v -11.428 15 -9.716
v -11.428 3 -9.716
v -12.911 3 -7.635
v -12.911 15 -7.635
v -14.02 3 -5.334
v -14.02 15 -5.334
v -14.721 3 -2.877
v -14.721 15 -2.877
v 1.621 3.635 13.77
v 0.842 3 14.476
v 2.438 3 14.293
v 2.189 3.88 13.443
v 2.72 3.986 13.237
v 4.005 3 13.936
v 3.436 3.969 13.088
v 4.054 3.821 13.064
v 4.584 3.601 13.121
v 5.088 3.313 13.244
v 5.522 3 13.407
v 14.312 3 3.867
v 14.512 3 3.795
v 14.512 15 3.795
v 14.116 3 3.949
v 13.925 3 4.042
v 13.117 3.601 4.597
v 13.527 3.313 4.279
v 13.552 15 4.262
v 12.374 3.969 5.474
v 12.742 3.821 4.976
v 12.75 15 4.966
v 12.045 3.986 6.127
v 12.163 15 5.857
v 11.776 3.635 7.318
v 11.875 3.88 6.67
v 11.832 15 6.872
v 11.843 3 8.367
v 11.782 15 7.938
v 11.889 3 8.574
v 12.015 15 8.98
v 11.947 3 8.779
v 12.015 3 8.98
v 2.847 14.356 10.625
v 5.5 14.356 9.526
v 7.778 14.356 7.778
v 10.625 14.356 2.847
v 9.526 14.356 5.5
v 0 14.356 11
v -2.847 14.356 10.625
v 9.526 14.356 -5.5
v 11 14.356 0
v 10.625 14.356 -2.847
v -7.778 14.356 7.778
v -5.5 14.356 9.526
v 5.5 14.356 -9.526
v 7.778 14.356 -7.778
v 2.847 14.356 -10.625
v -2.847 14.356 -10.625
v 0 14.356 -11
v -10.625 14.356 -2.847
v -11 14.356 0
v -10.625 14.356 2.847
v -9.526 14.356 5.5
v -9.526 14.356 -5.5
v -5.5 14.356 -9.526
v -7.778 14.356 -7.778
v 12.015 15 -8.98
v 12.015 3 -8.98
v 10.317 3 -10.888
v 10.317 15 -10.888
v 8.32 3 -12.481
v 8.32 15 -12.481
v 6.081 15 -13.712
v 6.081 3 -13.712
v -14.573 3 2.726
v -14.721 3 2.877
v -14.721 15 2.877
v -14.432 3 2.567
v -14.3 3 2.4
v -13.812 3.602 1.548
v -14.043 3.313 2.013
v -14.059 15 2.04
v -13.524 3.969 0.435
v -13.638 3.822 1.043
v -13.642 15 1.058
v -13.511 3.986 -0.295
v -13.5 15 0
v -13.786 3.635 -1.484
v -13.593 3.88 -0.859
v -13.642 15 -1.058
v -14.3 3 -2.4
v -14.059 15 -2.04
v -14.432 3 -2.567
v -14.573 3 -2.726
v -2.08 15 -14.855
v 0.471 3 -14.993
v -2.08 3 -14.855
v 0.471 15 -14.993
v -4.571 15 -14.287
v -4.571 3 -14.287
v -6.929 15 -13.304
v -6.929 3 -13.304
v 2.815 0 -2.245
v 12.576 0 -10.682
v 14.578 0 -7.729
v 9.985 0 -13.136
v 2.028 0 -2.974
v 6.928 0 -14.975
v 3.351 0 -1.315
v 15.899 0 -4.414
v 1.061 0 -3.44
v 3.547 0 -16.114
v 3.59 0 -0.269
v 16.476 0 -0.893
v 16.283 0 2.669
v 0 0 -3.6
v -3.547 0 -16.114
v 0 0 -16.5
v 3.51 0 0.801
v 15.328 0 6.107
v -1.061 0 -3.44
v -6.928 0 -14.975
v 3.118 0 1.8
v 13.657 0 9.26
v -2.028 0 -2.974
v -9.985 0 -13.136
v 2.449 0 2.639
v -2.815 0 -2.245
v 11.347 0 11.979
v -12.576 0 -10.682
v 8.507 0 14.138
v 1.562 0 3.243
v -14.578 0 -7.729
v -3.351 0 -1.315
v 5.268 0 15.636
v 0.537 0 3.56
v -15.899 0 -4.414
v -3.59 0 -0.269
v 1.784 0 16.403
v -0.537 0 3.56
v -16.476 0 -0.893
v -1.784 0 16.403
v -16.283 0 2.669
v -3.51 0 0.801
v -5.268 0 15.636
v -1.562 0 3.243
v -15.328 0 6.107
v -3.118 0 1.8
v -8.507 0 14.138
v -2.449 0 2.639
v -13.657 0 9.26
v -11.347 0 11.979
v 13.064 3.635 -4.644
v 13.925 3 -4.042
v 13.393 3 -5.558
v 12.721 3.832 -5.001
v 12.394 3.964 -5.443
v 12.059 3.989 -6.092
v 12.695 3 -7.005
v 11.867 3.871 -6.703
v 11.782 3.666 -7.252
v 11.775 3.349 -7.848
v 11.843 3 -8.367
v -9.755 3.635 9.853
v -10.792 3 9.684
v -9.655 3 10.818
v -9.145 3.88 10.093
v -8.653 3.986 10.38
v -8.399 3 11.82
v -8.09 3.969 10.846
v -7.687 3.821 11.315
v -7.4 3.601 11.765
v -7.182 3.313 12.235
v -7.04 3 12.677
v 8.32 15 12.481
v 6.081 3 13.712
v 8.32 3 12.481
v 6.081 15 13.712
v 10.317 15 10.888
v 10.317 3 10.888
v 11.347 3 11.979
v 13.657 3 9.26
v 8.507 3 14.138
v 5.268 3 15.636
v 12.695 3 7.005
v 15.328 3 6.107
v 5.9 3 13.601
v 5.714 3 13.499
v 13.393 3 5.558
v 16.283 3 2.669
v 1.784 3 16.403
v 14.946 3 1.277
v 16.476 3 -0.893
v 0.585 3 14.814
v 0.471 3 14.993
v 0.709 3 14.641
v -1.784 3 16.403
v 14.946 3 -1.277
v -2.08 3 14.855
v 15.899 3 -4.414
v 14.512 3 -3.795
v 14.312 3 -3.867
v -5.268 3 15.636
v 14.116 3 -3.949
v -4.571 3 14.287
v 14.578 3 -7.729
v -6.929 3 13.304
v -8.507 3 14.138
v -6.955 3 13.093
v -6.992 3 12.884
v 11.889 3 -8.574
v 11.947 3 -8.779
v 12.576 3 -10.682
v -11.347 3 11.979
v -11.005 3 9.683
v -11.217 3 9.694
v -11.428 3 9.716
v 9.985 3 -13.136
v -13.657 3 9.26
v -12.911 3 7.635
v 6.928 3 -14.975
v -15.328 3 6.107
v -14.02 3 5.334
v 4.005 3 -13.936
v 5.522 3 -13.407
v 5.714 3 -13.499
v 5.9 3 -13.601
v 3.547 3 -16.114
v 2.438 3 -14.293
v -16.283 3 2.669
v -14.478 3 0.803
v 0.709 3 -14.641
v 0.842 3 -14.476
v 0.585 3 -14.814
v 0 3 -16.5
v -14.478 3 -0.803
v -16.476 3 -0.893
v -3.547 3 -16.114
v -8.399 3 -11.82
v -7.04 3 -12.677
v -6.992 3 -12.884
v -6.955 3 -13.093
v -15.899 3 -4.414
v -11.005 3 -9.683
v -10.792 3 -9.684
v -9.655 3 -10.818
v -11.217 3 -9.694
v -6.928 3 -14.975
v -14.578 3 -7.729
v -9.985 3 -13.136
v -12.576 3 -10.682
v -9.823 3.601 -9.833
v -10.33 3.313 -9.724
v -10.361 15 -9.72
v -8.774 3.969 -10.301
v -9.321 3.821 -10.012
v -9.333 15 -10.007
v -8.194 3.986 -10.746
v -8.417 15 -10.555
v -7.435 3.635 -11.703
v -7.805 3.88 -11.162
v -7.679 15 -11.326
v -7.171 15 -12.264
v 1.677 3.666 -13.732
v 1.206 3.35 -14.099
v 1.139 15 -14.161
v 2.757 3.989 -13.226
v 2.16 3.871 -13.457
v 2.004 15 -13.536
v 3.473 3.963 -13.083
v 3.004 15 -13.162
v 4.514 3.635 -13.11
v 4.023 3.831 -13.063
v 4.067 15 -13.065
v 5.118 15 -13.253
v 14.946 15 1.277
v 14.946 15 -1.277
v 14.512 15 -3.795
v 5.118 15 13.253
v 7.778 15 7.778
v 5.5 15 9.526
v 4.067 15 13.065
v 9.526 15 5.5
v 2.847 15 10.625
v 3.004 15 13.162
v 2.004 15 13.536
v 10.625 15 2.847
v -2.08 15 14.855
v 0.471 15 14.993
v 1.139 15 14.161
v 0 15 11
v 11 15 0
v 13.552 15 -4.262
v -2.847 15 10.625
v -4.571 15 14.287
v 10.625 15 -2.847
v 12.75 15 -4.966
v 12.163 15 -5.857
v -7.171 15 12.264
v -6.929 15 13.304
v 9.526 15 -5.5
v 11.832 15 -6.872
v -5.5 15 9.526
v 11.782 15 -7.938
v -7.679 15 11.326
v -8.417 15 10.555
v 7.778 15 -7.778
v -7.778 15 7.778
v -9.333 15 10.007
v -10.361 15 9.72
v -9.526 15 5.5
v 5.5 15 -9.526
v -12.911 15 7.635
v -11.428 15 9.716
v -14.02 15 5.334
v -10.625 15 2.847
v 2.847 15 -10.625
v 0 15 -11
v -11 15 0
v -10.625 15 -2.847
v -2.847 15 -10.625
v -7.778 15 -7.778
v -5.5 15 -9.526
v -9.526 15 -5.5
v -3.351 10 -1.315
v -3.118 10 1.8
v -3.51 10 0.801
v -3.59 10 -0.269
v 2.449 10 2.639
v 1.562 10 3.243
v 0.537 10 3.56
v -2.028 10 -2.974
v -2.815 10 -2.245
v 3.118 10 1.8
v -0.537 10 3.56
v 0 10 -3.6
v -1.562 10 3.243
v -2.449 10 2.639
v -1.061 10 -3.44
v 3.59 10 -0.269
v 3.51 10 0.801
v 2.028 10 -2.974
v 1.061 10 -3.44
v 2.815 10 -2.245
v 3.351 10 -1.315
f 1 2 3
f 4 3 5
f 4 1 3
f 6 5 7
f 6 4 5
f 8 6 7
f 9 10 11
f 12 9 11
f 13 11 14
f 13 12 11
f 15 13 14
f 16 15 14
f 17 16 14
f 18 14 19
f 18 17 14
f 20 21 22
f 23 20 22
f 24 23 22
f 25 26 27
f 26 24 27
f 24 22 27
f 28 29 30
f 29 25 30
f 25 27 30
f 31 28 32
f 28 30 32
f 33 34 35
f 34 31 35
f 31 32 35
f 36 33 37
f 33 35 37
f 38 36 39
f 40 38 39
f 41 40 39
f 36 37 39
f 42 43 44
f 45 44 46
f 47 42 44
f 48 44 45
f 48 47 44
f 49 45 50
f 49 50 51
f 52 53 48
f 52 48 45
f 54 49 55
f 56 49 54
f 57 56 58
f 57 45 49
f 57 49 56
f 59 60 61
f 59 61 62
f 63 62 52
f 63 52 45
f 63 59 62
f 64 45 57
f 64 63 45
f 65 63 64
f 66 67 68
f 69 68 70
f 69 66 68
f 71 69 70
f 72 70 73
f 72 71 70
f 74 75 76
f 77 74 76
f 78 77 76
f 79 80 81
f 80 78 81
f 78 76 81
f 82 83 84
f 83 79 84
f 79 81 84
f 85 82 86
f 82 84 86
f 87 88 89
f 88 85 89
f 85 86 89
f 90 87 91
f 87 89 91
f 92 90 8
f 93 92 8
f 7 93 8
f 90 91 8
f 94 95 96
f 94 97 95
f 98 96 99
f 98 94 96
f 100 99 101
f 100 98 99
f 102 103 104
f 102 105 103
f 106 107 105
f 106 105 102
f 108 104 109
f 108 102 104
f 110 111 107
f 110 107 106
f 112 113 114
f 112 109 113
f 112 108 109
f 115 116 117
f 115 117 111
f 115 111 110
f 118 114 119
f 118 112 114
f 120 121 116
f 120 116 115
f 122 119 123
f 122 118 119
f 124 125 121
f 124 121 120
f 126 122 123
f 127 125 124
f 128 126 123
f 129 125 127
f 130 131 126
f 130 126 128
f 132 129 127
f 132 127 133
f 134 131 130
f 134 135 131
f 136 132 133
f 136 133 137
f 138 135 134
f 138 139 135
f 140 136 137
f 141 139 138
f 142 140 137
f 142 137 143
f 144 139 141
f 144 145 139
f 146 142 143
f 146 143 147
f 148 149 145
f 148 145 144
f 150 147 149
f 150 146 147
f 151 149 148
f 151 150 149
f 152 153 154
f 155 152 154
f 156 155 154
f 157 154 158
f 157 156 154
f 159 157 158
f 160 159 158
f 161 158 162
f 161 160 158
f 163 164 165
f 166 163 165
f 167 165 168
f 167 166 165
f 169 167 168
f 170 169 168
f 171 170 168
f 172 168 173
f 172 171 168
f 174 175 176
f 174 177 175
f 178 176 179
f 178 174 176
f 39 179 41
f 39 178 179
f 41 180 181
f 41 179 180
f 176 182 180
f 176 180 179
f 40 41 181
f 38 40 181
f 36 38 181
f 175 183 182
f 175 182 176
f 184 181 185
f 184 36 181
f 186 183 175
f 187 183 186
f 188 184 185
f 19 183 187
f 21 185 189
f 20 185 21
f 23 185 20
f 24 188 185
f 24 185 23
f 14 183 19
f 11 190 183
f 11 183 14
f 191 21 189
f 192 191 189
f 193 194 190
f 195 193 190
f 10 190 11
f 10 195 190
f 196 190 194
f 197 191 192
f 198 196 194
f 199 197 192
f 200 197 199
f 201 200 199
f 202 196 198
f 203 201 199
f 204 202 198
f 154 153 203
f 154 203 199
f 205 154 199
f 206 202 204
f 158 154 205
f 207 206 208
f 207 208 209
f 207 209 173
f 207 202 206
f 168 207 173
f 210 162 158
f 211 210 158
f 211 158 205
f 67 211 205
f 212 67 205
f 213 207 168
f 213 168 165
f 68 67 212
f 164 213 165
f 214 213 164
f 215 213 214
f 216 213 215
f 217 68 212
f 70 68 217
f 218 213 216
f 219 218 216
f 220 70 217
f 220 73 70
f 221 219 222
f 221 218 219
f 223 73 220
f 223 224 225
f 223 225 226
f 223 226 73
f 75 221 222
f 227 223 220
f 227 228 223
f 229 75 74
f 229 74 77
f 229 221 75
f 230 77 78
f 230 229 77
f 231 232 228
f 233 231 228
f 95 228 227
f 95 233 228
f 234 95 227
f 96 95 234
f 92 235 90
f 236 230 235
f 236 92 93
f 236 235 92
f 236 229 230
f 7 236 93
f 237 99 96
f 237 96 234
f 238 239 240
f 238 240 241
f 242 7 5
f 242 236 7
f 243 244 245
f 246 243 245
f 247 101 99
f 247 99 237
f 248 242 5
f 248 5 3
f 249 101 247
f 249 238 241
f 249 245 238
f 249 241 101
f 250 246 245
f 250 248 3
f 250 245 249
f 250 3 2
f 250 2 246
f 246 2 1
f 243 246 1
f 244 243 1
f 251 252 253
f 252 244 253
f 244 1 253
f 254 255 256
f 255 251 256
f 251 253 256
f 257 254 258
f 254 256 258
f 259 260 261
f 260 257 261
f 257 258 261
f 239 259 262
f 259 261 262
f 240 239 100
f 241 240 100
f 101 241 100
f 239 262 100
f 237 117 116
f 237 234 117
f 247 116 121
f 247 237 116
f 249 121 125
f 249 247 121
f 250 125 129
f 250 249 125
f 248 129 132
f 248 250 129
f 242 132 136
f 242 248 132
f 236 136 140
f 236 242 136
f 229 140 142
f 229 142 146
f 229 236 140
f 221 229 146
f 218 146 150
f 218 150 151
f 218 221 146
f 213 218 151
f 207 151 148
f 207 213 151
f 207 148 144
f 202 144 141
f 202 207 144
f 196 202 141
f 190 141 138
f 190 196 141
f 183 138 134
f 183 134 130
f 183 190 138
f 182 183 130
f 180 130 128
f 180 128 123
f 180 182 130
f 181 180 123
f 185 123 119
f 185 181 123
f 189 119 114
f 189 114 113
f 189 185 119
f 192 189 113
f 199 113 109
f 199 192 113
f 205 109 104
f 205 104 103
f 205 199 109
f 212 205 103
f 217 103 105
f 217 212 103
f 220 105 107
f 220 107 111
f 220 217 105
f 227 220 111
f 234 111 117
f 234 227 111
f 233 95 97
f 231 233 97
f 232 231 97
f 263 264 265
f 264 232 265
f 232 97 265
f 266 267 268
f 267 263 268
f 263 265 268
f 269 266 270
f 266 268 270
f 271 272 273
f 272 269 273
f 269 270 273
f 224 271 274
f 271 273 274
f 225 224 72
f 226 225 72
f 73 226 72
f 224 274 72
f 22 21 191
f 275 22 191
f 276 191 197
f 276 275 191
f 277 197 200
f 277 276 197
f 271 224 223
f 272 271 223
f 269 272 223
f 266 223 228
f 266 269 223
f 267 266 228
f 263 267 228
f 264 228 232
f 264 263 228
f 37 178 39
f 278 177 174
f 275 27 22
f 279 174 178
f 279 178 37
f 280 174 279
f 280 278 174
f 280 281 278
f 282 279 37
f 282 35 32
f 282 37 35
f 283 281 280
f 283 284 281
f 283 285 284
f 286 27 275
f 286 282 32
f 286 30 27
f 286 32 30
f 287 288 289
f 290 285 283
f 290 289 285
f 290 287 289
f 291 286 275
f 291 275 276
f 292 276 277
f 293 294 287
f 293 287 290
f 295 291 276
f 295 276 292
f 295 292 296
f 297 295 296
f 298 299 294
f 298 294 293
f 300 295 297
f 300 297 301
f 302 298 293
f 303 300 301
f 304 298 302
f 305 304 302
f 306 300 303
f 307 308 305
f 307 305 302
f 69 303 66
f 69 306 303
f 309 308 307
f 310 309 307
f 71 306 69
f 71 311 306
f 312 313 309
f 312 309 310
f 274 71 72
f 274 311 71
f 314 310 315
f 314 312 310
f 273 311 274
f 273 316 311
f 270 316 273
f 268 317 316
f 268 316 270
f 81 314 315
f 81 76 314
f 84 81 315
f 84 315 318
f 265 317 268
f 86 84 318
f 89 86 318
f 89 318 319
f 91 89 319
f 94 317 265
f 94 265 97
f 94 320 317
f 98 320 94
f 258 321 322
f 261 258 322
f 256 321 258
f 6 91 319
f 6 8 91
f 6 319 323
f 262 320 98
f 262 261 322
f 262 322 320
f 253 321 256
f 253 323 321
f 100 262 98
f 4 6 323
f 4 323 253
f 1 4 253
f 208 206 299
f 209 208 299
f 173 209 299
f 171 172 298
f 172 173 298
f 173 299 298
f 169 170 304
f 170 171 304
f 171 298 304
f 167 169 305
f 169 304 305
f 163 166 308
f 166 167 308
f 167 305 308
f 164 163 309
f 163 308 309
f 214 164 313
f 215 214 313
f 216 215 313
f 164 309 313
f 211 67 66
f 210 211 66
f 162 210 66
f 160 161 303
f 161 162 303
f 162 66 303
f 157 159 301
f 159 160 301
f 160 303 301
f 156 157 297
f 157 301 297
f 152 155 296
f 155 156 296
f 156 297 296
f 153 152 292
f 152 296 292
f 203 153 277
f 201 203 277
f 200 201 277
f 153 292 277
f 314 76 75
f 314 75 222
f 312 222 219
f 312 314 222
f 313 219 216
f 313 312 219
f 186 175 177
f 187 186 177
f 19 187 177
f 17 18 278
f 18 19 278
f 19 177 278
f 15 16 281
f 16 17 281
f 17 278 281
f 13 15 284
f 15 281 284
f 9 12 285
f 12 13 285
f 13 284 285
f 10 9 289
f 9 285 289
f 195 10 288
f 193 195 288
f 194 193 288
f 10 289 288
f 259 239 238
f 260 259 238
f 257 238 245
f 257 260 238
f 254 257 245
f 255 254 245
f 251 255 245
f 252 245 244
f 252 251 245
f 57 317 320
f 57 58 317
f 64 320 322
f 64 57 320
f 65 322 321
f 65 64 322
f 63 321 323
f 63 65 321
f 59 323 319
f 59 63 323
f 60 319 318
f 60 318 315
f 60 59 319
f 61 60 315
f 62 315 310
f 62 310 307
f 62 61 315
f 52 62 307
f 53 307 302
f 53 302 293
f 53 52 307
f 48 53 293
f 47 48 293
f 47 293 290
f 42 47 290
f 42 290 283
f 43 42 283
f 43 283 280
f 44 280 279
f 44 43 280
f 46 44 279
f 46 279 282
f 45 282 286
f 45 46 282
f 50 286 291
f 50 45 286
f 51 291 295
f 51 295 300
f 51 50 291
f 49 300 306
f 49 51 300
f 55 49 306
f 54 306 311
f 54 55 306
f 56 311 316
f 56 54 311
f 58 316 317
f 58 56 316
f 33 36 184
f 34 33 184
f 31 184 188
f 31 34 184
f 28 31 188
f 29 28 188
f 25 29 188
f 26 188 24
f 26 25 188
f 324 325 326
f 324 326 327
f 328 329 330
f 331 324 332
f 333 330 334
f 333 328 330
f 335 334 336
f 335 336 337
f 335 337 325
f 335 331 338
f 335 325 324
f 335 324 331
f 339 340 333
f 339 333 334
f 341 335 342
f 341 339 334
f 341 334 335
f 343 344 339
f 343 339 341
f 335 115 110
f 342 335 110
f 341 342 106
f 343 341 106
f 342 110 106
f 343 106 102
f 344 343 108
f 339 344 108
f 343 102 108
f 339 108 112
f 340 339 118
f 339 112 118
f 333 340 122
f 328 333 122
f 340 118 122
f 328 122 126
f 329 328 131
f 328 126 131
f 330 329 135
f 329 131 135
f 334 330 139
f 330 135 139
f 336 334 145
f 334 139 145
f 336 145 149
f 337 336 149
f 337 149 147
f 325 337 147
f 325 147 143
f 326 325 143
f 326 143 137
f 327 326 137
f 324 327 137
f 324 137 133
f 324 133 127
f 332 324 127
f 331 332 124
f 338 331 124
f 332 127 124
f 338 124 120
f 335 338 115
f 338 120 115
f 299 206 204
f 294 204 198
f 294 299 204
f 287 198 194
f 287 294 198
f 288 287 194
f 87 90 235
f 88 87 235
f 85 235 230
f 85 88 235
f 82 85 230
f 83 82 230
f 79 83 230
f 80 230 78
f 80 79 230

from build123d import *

# Parameters (mm, degrees)
SKETCH2_R          = 3.6
CUT_EXTRUDE1_DEPTH = 10
SKETCH3_R          = 4
CUT_EXTRUDE2_DEPTH = 11
CHAMFER1_SIZE      = 1.5


with BuildPart() as part:
    # Sketch1 → Revolve1 (revolve)
    with BuildSketch(Plane(origin=(0, 0, 0), x_dir=(0, 0, -1), z_dir=(1, 0, 0)), mode=Mode.PRIVATE) as revolve1_sk:
        Polygon((0, 0), (-16.5, 0), (-16.5, 3), (-15, 3), (-15, 15), (-11, 15), (-11, 14.355733533), (0, 14.355733533), align=None)
    revolve(revolve1_sk.sketch.rotate(Axis((0, 0, 0), (0, 1, 0)), 180), axis=Axis((0, 0, 0), (0, 1, 0)))

    # Sketch2 → Cut-Extrude1 (cut)
    with BuildSketch(Plane.XZ):
        with Locations(Location((0, 0, 0), (0, 0, 270))):
            Circle(SKETCH2_R)
    extrude(amount=-CUT_EXTRUDE1_DEPTH, mode=Mode.SUBTRACT)

    # Sketch3 → Cut-Extrude2 (cut)
    with BuildSketch(Plane(origin=(0, 15, 0), x_dir=(1, 0, 0), z_dir=(0, 1, 0))):
        with Locations((-17.5, 0)):
            Circle(SKETCH3_R)
        with Locations((-10.911071533, 13.682050943)):
            Circle(SKETCH3_R)
        with Locations((3.894116344, 17.061238463)):
            Circle(SKETCH3_R)
        with Locations((15.766955188, 7.592965435)):
            Circle(SKETCH3_R)
        with Locations((15.766955188, -7.592965435)):
            Circle(SKETCH3_R)
        with Locations((3.894116344, -17.061238463)):
            Circle(SKETCH3_R)
        with Locations((-10.911071533, -13.682050943)):
            Circle(SKETCH3_R)
    extrude(amount=-CUT_EXTRUDE2_DEPTH, mode=Mode.SUBTRACT)

    # Chamfer1
    # the kernel refuses this chamfer: 1.5 mm, written as the material it takes off along each edge
    with BuildSketch(Plane(origin=(0, 4, 0), x_dir=(-0.22388554303077474, 0, 0.974615443968448), z_dir=(-0.974615443968448, 0, -0.22388554303077474))) as chamfer1_piece_1_section:
        Polygon((15, -CHAMFER1_SIZE), (15 - CHAMFER1_SIZE, 0), (15, 0), align=None)
    chamfer1_piece_1 = revolve(axis=Axis((0, 4, 0), (0, 1, 0)), revolution_arc=51.588991206, mode=Mode.PRIVATE)
    chamfer1_piece_1 = split(chamfer1_piece_1, bisect_by=Plane(origin=(3.219301063, 3, 14.104691916), z_dir=(0, 1, 0)), keep=Keep.TOP, mode=Mode.PRIVATE)
    chamfer1_piece_1 = chamfer1_piece_1 & Plane(origin=(3.894116344, 3.575453248, 17.061238463), x_dir=(1, 0, 0), z_dir=(0, 1, 0)) * Cylinder(4, 60, mode=Mode.PRIVATE)
    add(chamfer1_piece_1, mode=Mode.SUBTRACT)
    with BuildSketch(Plane(origin=(0, 4, 0), x_dir=(-0.9015753902573829, 0, 0.43262202403743605), z_dir=(-0.43262202403743605, 0, -0.9015753902573829))) as chamfer1_piece_2_section:
        Polygon((15, -CHAMFER1_SIZE), (15 - CHAMFER1_SIZE, 0), (15, 0), align=None)
    chamfer1_piece_2 = revolve(axis=Axis((0, 4, 0), (0, 1, 0)), revolution_arc=51.588991206, mode=Mode.PRIVATE)
    chamfer1_piece_2 = split(chamfer1_piece_2, bisect_by=Plane(origin=(-9.020290662, 3, 11.311082492), z_dir=(0, 1, 0)), keep=Keep.TOP, mode=Mode.PRIVATE)
    chamfer1_piece_2 = chamfer1_piece_2 & Plane(origin=(-10.911071533, 3.575453183, 13.682050943), x_dir=(1, 0, 0), z_dir=(0, 1, 0)) * Cylinder(4, 60, mode=Mode.PRIVATE)
    add(chamfer1_piece_2, mode=Mode.SUBTRACT)
    with BuildSketch(Plane(origin=(0, 4, 0), x_dir=(-0.9003605798337992, 0, -0.4351446038747863), z_dir=(0.4351446038747863, 0, -0.9003605798337992))) as chamfer1_piece_3_section:
        Polygon((15, -CHAMFER1_SIZE), (15 - CHAMFER1_SIZE, 0), (15, 0), align=None)
    chamfer1_piece_3 = revolve(axis=Axis((0, 4, 0), (0, 1, 0)), revolution_arc=51.588991206, mode=Mode.PRIVATE)
    chamfer1_piece_3 = split(chamfer1_piece_3, bisect_by=Plane(origin=(-14.467418648, 3, -5.57e-07), z_dir=(0, 1, 0)), keep=Keep.TOP, mode=Mode.PRIVATE)
    chamfer1_piece_3 = chamfer1_piece_3 & Plane(origin=(-17.5, 3.575453666, 0), x_dir=(1, 0, 0), z_dir=(0, 1, 0)) * Cylinder(4, 60, mode=Mode.PRIVATE)
    add(chamfer1_piece_3, mode=Mode.SUBTRACT)
    with BuildSketch(Plane(origin=(0, 4, 0), x_dir=(-0.2211558887866005, 0, -0.9752384697370221), z_dir=(0.9752384697370221, 0, -0.2211558887866005))) as chamfer1_piece_4_section:
        Polygon((15, -CHAMFER1_SIZE), (15 - CHAMFER1_SIZE, 0), (15, 0), align=None)
    chamfer1_piece_4 = revolve(axis=Axis((0, 4, 0), (0, 1, 0)), revolution_arc=51.588991206, mode=Mode.PRIVATE)
    chamfer1_piece_4 = split(chamfer1_piece_4, bisect_by=Plane(origin=(-9.020286489, 3, -11.311086109), z_dir=(0, 1, 0)), keep=Keep.TOP, mode=Mode.PRIVATE)
    chamfer1_piece_4 = chamfer1_piece_4 & Plane(origin=(-10.911071533, 3.575453389, -13.682050943), x_dir=(1, 0, 0), z_dir=(0, 1, 0)) * Cylinder(4, 60, mode=Mode.PRIVATE)
    add(chamfer1_piece_4, mode=Mode.SUBTRACT)
    with BuildSketch(Plane(origin=(0, 4, 0), x_dir=(0.6245836972749009, 0, -0.7809578766479117), z_dir=(0.7809578766479117, 0, 0.6245836972749009))) as chamfer1_piece_5_section:
        Polygon((15, -CHAMFER1_SIZE), (15 - CHAMFER1_SIZE, 0), (15, 0), align=None)
    chamfer1_piece_5 = revolve(axis=Axis((0, 4, 0), (0, 1, 0)), revolution_arc=51.588991206, mode=Mode.PRIVATE)
    chamfer1_piece_5 = split(chamfer1_piece_5, bisect_by=Plane(origin=(3.219306774, 3, -14.104690845), z_dir=(0, 1, 0)), keep=Keep.TOP, mode=Mode.PRIVATE)
    chamfer1_piece_5 = chamfer1_piece_5 & Plane(origin=(3.894116344, 3.575453353, -17.061238463), x_dir=(1, 0, 0), z_dir=(0, 1, 0)) * Cylinder(4, 60, mode=Mode.PRIVATE)
    add(chamfer1_piece_5, mode=Mode.SUBTRACT)
    with BuildSketch(Plane(origin=(0, 4, 0), x_dir=(0.9999990201028447, 0, 0.001399926194576086), z_dir=(-0.001399926194576086, 0, 0.9999990201028447))) as chamfer1_piece_6_section:
        Polygon((15, -CHAMFER1_SIZE), (15 - CHAMFER1_SIZE, 0), (15, 0), align=None)
    chamfer1_piece_6 = revolve(axis=Axis((0, 4, 0), (0, 1, 0)), revolution_arc=51.588991206, mode=Mode.PRIVATE)
    chamfer1_piece_6 = split(chamfer1_piece_6, bisect_by=Plane(origin=(13.034696257, 3, -6.2771755), z_dir=(0, 1, 0)), keep=Keep.TOP, mode=Mode.PRIVATE)
    chamfer1_piece_6 = chamfer1_piece_6 & Plane(origin=(15.766955188, 3.575453245, -7.592965435), x_dir=(1, 0, 0), z_dir=(0, 1, 0)) * Cylinder(4, 60, mode=Mode.PRIVATE)
    add(chamfer1_piece_6, mode=Mode.SUBTRACT)
    with BuildSketch(Plane(origin=(0, 4, 0), x_dir=(0.622394684530797, 0, 0.782703556059259), z_dir=(-0.782703556059259, 0, 0.622394684530797))) as chamfer1_piece_7_section:
        Polygon((15, -CHAMFER1_SIZE), (15 - CHAMFER1_SIZE, 0), (15, 0), align=None)
    chamfer1_piece_7 = revolve(axis=Axis((0, 4, 0), (0, 1, 0)), revolution_arc=51.588991206, mode=Mode.PRIVATE)
    chamfer1_piece_7 = split(chamfer1_piece_7, bisect_by=Plane(origin=(13.03469369, 3, 6.277180857), z_dir=(0, 1, 0)), keep=Keep.TOP, mode=Mode.PRIVATE)
    chamfer1_piece_7 = chamfer1_piece_7 & Plane(origin=(15.766955188, 3.575453554, 7.592965435), x_dir=(1, 0, 0), z_dir=(0, 1, 0)) * Cylinder(4, 61, mode=Mode.PRIVATE)
    add(chamfer1_piece_7, mode=Mode.SUBTRACT)


solid = part.part
